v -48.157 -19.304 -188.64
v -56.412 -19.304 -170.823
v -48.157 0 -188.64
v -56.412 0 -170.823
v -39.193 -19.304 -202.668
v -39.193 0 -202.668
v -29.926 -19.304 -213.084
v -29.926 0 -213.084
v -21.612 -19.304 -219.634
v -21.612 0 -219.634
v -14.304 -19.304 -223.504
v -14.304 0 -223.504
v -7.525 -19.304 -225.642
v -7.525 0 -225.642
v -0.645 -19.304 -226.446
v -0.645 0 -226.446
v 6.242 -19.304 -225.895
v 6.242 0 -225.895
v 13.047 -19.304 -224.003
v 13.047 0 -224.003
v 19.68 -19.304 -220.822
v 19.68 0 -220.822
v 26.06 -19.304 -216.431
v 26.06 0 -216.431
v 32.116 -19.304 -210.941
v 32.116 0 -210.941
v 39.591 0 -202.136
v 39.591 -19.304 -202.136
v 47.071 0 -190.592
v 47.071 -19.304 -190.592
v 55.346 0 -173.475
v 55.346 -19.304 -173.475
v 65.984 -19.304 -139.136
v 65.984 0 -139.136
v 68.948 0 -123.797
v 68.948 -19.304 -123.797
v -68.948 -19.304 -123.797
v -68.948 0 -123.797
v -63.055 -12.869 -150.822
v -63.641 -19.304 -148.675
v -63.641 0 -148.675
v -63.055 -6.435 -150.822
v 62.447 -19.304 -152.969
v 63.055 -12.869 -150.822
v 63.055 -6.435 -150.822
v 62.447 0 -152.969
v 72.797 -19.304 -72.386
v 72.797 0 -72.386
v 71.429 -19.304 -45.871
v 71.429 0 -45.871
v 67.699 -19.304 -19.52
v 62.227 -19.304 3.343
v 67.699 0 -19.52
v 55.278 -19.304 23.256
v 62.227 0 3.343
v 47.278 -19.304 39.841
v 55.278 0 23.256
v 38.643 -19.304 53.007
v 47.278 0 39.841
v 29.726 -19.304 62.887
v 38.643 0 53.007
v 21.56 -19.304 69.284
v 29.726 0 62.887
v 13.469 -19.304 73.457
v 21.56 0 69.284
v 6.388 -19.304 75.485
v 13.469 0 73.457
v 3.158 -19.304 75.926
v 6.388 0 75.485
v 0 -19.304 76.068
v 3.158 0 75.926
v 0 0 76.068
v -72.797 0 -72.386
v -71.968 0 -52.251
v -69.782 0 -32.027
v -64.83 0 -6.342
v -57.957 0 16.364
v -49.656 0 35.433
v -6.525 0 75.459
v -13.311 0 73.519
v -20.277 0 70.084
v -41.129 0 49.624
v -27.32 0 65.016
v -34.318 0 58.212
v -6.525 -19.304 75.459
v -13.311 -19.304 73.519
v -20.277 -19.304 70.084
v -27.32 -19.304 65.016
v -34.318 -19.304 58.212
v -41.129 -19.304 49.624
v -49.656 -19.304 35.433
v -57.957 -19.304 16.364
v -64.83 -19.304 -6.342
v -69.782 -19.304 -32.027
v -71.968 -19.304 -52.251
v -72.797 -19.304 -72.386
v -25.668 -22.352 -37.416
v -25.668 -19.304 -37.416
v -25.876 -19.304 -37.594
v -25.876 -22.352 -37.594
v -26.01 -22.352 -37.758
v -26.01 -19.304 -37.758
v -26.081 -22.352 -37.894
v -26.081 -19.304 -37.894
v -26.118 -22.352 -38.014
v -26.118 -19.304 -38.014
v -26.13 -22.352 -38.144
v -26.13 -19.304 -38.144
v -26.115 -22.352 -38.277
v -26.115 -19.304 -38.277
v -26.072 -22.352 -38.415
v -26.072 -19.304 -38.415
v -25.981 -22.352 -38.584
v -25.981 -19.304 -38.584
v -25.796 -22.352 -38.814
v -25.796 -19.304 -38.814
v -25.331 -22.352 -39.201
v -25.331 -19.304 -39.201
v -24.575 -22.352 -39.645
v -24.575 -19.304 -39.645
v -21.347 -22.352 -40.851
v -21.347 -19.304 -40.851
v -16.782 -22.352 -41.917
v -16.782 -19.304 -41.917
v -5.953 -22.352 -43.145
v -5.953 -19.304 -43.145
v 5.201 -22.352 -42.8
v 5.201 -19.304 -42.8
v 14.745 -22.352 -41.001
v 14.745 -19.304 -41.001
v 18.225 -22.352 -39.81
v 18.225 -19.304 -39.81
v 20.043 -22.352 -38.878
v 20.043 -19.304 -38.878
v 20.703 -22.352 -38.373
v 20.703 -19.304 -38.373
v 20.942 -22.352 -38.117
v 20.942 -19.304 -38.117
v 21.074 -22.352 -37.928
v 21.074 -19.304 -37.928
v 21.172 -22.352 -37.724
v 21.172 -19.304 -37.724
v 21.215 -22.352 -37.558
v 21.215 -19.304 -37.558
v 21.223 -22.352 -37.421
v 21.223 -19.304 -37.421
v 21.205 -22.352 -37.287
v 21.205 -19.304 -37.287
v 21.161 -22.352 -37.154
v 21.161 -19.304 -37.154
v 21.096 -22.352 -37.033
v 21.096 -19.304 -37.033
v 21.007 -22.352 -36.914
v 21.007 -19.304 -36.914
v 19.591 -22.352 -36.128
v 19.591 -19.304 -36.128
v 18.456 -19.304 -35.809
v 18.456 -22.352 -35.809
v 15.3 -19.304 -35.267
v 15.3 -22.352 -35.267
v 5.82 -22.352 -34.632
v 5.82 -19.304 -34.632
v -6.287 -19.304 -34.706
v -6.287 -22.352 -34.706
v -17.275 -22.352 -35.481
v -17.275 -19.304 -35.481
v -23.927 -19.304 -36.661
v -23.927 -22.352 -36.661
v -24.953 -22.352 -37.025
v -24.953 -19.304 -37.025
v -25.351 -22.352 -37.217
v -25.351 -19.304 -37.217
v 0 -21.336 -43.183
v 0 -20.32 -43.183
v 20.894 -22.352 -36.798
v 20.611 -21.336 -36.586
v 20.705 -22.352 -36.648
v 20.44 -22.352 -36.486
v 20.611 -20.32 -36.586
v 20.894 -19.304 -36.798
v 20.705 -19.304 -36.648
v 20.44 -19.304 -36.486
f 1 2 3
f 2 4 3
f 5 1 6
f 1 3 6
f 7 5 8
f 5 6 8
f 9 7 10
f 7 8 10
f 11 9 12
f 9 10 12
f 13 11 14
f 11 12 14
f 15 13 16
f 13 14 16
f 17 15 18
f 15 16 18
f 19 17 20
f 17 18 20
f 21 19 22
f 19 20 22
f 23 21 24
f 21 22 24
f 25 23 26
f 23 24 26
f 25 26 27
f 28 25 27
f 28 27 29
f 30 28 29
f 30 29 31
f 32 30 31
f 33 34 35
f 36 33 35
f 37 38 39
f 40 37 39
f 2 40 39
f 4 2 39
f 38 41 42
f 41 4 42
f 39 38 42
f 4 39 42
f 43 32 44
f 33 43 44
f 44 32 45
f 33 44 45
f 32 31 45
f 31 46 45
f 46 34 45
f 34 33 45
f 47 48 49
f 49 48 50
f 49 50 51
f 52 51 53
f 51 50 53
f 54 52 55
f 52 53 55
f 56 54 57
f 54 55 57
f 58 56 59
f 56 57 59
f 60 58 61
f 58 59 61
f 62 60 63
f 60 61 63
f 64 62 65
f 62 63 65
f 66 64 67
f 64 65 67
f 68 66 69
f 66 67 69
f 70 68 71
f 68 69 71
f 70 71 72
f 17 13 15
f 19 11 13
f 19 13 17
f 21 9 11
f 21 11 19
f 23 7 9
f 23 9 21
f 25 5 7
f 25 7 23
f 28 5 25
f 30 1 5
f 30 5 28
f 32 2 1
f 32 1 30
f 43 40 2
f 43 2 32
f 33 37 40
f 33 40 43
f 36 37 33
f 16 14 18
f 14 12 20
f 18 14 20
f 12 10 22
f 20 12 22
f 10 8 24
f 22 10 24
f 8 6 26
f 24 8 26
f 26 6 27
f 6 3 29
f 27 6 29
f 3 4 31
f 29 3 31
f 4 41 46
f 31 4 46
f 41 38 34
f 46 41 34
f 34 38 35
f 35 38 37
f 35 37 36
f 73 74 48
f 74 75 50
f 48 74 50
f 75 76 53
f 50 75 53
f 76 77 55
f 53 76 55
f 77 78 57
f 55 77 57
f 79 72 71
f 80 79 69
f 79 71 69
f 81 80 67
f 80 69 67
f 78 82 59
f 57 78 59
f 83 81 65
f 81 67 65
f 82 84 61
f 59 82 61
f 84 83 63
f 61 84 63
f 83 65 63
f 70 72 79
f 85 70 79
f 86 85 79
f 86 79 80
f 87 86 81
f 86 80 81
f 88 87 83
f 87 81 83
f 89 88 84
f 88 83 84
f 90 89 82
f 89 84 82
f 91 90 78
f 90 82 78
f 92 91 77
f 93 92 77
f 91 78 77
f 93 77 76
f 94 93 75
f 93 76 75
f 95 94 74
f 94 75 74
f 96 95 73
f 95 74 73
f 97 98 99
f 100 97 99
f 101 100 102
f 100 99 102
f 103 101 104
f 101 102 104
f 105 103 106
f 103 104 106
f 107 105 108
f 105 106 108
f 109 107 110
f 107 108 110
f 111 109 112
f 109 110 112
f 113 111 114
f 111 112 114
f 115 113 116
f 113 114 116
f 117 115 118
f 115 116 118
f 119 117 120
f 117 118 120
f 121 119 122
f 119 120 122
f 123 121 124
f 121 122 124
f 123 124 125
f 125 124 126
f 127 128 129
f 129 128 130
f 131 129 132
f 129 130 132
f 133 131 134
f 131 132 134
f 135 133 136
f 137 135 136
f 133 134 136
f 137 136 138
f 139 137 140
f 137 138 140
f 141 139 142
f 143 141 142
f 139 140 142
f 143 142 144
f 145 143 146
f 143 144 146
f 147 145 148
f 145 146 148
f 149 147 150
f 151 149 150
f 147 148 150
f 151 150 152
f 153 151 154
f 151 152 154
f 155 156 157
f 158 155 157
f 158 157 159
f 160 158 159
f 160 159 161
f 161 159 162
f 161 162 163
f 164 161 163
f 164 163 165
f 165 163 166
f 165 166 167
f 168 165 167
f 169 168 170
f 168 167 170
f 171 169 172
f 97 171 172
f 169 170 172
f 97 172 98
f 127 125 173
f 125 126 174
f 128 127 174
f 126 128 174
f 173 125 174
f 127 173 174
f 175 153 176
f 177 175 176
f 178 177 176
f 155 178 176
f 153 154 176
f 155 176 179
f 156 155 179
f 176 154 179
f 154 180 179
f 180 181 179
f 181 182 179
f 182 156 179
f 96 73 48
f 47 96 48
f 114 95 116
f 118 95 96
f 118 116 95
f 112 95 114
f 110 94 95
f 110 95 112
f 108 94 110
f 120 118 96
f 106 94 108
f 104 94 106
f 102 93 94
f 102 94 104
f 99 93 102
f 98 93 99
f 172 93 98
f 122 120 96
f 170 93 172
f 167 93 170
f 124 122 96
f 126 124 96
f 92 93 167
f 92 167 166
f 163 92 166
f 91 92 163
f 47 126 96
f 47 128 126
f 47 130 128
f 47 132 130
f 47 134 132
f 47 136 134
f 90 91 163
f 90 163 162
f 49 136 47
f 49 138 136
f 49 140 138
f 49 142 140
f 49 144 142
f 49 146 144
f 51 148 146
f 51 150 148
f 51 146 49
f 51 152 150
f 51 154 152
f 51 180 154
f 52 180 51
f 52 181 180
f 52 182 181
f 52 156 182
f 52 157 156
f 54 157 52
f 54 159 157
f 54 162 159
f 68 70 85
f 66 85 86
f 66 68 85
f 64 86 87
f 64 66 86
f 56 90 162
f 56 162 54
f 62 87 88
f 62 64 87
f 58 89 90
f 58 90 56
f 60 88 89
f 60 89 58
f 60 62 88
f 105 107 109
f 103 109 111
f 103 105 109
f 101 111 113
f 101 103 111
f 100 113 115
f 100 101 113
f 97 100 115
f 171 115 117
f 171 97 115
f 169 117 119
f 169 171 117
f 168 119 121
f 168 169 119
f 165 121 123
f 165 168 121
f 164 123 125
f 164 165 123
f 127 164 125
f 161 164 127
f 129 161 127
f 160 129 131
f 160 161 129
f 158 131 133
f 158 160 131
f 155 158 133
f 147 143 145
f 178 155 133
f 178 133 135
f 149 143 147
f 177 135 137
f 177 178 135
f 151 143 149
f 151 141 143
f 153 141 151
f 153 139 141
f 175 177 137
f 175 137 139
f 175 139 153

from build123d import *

# Parameters (mm, degrees)
F1_DEPTH = 19.304
F2_W     = 150.1865312457
F2_H     = 51.410831511
F3_DEPTH = 22.606
F5_DEPTH = 3.048


with BuildPart() as f1:
    # F0 (on Front) → F1 (new body)
    with BuildSketch(Plane.XZ):
        with BuildLine():
            add(Edge.make_bspline(
                [(0, 76.0679021478), (-126.1104521631, 76.0679021478), (-63.0552260816, -150.8217677474), (0, -377.7114376426), (63.0552260816, -150.8217677474), (126.1104521631, 76.0679021478), (0, 76.0679021478)],
                knots=[0, 0, 0, 2.0943951024, 2.0943951024, 4.1887902048, 4.1887902048, 6.2831853072, 6.2831853072, 6.2831853072], degree=2, weights=[1, 0.5, 1, 0.5, 1, 0.5, 1]))
        make_face()
    extrude(amount=F1_DEPTH)

    # F2 (on Front) → F3 (cut)
    with BuildSketch(Plane.XZ):
        with Locations((-0.5564652383, -98.0915315449)):
            Rectangle(F2_W, F2_H)
    extrude(amount=F3_DEPTH, mode=Mode.SUBTRACT)

    # F4 (on face) → F5 (join)
    with BuildSketch(Plane.XZ.offset(19.304)):
        with BuildLine():
            add(Edge.make_bspline(
                [(-25.6680138409, -37.415780127), (-28.9839463214, -39.8456836206), (-0.1049279853, -47.1434588764), (40.822560782, -32.9041713044), (-21.2696628827, -34.192684234), (-25.6680138409, -37.415780127)],
                knots=[0, 0, 0, 0, 0.3092707929, 0.5897740692, 1, 1, 1, 1], degree=3))
        make_face()
    extrude(amount=F5_DEPTH)


solid = f1.part
